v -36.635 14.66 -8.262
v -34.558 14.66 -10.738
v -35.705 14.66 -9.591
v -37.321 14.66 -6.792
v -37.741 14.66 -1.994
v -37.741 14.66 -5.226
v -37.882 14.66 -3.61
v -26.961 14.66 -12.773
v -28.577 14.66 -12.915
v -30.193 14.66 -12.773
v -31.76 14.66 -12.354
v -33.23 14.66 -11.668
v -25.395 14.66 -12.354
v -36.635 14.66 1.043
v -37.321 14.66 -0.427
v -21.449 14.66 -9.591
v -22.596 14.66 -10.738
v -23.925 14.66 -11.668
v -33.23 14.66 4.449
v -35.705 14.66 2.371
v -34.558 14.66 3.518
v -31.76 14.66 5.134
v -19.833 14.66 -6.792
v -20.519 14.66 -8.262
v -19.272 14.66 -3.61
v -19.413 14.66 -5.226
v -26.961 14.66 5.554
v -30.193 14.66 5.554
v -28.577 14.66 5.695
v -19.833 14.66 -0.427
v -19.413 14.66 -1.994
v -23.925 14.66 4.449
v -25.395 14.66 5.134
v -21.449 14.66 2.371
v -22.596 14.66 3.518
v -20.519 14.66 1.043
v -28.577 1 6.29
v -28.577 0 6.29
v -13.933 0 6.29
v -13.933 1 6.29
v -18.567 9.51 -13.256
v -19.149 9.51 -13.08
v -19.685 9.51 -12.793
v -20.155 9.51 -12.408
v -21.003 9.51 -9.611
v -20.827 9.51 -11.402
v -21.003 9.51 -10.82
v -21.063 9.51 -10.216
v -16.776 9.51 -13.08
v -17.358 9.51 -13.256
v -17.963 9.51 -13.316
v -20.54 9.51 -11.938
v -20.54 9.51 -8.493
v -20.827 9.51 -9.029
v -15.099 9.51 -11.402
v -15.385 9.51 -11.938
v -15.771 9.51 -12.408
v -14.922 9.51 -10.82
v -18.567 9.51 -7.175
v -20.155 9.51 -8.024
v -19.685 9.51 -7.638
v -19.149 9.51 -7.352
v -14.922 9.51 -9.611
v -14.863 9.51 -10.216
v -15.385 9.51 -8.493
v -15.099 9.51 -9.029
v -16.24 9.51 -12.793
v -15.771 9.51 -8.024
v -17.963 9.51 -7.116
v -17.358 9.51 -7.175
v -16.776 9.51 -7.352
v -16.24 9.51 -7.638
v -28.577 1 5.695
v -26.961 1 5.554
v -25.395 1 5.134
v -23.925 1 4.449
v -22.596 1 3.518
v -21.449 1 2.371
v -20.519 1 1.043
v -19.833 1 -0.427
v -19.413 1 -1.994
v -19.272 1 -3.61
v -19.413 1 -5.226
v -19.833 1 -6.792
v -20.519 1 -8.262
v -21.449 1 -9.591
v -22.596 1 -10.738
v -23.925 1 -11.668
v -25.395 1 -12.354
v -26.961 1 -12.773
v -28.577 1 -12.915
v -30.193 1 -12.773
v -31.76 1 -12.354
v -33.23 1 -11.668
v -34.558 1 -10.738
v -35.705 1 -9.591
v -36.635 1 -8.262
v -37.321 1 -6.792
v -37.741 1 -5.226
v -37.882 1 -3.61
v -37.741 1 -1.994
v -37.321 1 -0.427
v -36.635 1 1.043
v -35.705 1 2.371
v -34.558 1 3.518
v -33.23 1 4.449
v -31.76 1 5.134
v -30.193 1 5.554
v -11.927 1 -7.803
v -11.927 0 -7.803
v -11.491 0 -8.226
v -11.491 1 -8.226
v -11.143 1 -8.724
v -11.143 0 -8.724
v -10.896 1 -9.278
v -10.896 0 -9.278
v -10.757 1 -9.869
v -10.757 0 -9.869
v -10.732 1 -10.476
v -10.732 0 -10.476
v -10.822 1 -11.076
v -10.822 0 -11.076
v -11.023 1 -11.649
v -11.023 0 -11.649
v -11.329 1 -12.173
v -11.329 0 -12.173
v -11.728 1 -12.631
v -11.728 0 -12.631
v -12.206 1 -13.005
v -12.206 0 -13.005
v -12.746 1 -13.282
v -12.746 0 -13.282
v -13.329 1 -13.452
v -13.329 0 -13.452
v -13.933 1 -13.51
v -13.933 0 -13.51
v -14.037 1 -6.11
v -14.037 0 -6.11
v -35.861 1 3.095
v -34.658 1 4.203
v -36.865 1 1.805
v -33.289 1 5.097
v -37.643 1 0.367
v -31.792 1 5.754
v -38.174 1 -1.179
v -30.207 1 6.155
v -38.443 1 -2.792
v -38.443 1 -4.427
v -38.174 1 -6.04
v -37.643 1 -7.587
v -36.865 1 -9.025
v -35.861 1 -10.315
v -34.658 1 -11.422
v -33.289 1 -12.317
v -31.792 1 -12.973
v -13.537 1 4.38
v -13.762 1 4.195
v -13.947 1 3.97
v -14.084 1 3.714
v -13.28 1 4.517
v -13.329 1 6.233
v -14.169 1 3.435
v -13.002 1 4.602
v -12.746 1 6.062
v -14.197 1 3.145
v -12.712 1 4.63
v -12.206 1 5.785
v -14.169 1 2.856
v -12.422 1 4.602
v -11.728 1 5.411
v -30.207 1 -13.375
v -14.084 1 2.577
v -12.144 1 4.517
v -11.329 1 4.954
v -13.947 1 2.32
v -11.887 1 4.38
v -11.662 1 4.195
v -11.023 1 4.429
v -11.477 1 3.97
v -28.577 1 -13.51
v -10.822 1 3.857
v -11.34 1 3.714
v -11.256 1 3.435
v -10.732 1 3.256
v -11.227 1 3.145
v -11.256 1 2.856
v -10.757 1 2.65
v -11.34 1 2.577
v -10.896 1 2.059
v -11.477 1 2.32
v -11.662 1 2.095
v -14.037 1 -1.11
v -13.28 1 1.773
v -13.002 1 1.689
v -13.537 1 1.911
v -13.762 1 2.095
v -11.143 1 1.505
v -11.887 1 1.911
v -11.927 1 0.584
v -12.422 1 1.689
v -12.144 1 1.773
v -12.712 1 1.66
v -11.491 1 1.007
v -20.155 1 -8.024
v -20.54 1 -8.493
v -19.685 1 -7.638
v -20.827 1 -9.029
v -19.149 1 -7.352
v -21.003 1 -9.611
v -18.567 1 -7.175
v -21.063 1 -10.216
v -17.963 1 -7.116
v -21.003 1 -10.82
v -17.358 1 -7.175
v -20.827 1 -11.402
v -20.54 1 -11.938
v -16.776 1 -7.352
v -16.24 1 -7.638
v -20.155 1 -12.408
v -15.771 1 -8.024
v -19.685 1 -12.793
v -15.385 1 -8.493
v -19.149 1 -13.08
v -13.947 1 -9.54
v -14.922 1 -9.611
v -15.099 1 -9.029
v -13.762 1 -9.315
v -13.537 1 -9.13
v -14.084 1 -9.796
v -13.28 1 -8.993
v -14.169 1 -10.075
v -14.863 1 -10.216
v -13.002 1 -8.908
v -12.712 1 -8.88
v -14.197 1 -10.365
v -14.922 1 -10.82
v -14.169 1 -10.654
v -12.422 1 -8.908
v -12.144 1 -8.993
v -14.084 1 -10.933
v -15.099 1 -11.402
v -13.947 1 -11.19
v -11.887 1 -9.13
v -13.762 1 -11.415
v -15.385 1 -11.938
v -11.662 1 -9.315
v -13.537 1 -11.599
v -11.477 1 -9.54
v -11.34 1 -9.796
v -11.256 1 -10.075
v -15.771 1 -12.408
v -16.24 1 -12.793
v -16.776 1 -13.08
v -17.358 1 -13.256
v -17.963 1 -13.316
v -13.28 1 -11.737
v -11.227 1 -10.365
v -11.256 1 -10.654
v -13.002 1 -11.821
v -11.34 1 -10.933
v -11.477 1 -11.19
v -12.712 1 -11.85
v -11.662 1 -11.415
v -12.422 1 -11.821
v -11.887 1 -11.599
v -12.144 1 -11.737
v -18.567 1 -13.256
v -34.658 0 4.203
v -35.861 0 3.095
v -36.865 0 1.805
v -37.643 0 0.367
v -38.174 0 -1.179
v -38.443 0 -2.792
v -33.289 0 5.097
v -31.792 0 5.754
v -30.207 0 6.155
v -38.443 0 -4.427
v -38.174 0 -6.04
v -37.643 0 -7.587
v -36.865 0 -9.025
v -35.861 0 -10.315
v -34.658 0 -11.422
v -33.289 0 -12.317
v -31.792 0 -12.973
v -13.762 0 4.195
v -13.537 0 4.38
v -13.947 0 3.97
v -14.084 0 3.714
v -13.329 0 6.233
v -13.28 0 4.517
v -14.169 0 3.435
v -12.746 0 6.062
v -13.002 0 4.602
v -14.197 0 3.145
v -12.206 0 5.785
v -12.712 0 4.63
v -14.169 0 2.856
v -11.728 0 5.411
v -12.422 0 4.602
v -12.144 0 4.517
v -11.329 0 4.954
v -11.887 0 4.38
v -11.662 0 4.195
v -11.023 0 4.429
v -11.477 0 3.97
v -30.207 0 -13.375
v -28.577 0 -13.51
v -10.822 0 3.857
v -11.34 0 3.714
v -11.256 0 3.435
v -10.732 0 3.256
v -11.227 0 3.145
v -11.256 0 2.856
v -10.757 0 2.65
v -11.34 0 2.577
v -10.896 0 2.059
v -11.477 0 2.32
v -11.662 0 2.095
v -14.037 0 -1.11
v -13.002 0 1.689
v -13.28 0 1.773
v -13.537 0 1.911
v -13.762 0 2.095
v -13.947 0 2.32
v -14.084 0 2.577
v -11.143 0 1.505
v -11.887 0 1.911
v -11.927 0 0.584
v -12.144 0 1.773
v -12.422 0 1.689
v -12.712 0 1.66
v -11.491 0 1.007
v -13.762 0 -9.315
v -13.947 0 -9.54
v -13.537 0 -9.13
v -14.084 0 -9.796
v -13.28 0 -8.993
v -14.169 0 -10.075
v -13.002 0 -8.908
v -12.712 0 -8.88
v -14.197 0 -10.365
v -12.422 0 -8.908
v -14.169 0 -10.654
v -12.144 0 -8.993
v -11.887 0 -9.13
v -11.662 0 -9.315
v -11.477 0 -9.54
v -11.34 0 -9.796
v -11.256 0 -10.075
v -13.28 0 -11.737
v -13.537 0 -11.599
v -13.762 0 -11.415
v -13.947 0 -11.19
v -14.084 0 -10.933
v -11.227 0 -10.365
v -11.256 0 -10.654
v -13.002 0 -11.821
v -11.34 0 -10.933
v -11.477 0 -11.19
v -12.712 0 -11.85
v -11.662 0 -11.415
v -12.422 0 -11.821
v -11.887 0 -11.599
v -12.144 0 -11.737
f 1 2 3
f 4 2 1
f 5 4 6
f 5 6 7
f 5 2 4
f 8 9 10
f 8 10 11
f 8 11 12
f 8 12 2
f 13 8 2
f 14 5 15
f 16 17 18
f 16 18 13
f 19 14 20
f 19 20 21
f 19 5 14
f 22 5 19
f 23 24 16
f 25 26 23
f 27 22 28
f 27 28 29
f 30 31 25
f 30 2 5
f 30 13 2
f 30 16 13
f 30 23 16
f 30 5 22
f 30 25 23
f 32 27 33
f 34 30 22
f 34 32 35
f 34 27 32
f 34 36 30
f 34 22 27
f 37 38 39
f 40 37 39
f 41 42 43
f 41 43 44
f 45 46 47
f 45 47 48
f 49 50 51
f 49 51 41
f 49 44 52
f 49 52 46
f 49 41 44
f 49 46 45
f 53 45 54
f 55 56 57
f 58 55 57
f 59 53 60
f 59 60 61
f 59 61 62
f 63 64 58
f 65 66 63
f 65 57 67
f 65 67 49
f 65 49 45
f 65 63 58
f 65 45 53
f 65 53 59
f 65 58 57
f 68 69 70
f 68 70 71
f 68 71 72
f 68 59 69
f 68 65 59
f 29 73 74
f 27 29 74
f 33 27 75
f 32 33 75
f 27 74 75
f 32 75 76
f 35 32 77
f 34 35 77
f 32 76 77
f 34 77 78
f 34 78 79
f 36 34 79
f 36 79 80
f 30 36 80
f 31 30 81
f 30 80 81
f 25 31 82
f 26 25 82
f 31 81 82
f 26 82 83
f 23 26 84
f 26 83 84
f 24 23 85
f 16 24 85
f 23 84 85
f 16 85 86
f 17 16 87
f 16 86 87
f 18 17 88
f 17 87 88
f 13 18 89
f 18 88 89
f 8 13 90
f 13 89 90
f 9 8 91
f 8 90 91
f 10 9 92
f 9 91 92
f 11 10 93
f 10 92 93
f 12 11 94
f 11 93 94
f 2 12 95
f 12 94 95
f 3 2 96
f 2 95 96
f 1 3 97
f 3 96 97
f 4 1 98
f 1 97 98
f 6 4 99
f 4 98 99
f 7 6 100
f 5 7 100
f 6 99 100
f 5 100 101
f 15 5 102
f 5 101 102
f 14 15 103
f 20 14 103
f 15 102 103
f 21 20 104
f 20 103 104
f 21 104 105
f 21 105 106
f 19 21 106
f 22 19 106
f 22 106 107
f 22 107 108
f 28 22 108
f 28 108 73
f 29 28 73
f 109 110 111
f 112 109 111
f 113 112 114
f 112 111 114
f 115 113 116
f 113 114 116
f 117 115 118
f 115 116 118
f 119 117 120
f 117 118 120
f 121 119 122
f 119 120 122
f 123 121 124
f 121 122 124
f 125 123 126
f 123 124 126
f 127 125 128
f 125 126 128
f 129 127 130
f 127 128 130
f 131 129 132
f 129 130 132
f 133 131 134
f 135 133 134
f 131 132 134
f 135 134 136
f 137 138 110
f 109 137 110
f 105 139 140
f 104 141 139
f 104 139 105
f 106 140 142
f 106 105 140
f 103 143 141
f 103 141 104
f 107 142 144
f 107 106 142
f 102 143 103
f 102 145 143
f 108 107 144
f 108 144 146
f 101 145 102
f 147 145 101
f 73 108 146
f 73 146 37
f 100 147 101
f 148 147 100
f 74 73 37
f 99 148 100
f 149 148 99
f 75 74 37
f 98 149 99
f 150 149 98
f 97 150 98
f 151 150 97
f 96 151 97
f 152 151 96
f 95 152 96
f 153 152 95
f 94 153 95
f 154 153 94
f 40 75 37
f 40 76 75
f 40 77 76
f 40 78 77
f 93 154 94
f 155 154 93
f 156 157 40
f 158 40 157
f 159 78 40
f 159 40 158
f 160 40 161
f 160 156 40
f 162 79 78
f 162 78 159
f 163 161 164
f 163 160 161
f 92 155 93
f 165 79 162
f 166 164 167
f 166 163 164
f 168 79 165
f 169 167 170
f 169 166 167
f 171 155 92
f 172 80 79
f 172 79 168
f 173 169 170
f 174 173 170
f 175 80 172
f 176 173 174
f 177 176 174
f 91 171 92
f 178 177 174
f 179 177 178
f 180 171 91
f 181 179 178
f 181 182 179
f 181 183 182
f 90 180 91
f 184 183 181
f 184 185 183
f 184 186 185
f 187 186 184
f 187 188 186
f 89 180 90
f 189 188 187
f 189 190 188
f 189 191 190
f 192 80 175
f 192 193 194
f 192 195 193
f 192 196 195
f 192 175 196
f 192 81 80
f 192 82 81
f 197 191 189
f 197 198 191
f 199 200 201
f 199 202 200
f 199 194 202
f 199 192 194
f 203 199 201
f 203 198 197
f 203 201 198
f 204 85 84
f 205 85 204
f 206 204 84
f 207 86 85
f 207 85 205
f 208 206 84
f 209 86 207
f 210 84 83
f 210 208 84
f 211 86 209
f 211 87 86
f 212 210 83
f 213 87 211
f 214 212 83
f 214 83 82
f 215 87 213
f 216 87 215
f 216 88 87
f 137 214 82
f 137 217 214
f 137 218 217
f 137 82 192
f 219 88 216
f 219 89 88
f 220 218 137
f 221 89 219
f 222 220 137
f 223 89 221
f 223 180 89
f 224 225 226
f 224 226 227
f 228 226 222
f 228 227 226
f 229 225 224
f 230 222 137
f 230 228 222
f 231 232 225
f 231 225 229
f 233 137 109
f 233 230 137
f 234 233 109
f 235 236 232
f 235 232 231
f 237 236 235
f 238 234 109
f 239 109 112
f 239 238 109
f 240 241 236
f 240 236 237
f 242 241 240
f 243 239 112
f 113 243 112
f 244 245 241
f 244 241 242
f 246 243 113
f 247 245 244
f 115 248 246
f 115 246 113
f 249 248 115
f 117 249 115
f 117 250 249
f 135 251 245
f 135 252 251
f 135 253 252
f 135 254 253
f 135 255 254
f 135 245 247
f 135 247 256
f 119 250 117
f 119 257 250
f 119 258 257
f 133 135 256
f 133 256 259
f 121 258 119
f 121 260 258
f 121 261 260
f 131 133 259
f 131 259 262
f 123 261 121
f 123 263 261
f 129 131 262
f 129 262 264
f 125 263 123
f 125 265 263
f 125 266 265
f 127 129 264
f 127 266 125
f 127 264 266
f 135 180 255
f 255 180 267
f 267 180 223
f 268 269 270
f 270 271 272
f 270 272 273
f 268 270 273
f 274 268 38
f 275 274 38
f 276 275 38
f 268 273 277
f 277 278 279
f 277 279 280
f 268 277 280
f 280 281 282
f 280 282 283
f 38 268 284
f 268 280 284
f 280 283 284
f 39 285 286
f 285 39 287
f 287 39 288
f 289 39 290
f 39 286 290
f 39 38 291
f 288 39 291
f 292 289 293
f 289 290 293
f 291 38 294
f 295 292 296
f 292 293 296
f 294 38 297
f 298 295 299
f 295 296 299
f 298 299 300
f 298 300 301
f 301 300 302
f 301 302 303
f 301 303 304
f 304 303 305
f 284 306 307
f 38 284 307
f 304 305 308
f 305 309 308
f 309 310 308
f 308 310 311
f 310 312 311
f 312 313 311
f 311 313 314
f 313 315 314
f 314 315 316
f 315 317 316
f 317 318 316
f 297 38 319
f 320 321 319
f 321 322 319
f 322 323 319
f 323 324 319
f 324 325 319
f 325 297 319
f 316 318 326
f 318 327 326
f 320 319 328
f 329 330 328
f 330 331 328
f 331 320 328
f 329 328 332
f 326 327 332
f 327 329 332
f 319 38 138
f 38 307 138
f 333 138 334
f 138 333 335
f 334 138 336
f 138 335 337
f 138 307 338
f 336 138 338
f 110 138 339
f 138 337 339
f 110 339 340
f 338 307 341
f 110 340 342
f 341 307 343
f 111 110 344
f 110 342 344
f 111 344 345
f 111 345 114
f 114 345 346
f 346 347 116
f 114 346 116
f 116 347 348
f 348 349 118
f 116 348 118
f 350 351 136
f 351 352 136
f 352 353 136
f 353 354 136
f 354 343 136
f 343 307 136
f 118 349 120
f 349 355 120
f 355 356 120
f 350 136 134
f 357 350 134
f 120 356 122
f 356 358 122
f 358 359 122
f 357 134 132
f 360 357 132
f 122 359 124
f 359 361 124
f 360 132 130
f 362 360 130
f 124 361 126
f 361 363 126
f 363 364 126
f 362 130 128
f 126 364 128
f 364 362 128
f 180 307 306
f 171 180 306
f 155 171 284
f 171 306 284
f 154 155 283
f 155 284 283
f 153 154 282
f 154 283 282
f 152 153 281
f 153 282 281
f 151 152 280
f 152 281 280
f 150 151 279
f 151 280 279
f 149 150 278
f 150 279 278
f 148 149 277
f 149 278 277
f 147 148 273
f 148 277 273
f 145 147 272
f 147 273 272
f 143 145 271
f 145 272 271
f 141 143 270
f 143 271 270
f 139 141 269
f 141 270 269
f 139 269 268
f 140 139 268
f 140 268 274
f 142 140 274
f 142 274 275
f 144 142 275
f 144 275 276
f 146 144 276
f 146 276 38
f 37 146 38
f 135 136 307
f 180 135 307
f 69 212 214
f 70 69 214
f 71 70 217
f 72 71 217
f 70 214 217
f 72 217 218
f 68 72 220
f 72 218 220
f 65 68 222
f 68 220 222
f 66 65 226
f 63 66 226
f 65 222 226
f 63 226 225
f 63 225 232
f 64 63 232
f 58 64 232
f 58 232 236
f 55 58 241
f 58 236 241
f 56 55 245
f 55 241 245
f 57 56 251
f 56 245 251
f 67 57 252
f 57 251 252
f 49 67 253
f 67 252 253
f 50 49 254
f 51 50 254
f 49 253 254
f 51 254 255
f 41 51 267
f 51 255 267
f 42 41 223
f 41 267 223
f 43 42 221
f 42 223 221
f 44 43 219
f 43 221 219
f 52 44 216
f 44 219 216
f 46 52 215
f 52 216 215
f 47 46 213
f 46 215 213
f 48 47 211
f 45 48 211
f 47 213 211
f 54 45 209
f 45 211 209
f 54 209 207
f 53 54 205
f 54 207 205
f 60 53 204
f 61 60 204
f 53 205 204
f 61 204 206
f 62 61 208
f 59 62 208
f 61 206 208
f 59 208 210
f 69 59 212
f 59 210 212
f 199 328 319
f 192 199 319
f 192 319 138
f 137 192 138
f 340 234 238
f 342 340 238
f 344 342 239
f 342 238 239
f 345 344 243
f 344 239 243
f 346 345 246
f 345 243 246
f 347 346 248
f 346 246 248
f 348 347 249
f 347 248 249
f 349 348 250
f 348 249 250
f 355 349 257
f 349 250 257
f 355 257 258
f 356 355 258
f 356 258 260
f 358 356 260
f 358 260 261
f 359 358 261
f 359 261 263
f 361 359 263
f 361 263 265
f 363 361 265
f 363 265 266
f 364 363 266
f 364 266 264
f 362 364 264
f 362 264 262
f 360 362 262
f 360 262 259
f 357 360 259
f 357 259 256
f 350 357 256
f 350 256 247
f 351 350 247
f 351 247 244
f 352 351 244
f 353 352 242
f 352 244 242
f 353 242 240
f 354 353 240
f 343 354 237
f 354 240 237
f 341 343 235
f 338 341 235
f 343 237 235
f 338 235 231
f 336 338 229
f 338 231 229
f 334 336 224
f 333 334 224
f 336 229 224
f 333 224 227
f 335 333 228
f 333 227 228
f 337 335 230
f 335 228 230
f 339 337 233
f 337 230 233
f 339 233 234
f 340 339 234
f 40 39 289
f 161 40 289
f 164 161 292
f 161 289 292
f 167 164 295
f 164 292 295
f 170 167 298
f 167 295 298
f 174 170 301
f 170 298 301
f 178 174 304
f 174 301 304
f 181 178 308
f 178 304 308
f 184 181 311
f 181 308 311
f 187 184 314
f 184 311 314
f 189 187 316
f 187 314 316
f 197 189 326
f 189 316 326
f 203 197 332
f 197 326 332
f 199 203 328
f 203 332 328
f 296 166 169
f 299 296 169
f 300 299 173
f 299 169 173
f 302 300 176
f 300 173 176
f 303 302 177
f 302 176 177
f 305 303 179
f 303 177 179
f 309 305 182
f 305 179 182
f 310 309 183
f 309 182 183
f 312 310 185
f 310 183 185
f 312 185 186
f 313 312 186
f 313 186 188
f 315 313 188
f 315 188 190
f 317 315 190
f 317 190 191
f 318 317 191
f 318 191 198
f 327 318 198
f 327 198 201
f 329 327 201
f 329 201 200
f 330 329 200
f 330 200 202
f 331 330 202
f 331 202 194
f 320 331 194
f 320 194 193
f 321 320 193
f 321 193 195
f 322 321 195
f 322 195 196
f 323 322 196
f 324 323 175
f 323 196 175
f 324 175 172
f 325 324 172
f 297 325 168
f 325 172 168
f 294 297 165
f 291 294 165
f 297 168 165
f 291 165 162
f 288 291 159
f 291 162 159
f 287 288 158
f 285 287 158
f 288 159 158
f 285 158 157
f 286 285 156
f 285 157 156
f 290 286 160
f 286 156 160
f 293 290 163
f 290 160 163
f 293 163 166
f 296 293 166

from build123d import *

# Parameters (mm, degrees)
BOSS_EXTRUDE1_DEPTH = 1
SKETCH2_R           = 9.305
BOSS_EXTRUDE2_DEPTH = 13.66
SKETCH3_R           = 3.1
BOSS_EXTRUDE3_DEPTH = 8.51
SKETCH4_R           = 1.485
CUT_EXTRUDE1_DEPTH  = 8.51


with BuildPart() as part:
    # Sketch1 → Boss-Extrude1 (new body)
    with BuildSketch(Plane(origin=(0, 0, 0), x_dir=(1, 0, 0), z_dir=(0, 1, 0))):
        with BuildLine():
            Line((-13.933041308, 13.509742501), (-28.57709975, 13.509742501))
            ThreePointArc((-28.57709975, 13.509742501), (-38.47709975, 3.609742501), (-28.57709975, -6.290257499))
            Line((-28.57709975, -6.290257499), (-13.933041308, -6.290257499))
            ThreePointArc((-13.933041308, -6.290257499), (-10.908622294, -4.147777693), (-11.926545628, -0.583908702))
            Line((-11.926545628, -0.583908702), (-14.03709975, 1.109742501))
            Line((-14.03709975, 1.109742501), (-14.03709975, 6.109742501))
            Line((-14.03709975, 6.109742501), (-11.926545628, 7.803393704))
            ThreePointArc((-11.926545628, 7.803393704), (-10.908622294, 11.367262695), (-13.933041308, 13.509742501))
        make_face()
    extrude(amount=BOSS_EXTRUDE1_DEPTH)

    # Sketch2 → Boss-Extrude2 (add)
    with BuildSketch(Plane(origin=(0, 1, 0), x_dir=(1, 0, 0), z_dir=(0, 1, 0))):
        with Locations(Location((-28.57709975, 3.609742501, 0), (0, 0, 270))):
            Circle(SKETCH2_R)
    extrude(amount=BOSS_EXTRUDE2_DEPTH)

    # Sketch3 → Boss-Extrude3 (add)
    with BuildSketch(Plane(origin=(0, 1, 0), x_dir=(1, 0, 0), z_dir=(0, 1, 0))):
        with Locations(Location((-17.962659231, 10.215706191, 0), (0, 0, 270))):
            Circle(SKETCH3_R)
    extrude(amount=BOSS_EXTRUDE3_DEPTH)

    # Sketch4 → Cut-Extrude1 (cut)
    with BuildSketch(Plane(origin=(0, 1, 0), x_dir=(1, 0, 0), z_dir=(0, 1, 0))):
        with Locations(Location((-12.71209975, 10.364742501, 0), (0, 0, 270))):
            Circle(SKETCH4_R)
        with Locations(Location((-12.71209975, -3.145257499, 0), (0, 0, 270))):
            Circle(SKETCH4_R)
    extrude(amount=-CUT_EXTRUDE1_DEPTH, mode=Mode.SUBTRACT)


solid = part.part
